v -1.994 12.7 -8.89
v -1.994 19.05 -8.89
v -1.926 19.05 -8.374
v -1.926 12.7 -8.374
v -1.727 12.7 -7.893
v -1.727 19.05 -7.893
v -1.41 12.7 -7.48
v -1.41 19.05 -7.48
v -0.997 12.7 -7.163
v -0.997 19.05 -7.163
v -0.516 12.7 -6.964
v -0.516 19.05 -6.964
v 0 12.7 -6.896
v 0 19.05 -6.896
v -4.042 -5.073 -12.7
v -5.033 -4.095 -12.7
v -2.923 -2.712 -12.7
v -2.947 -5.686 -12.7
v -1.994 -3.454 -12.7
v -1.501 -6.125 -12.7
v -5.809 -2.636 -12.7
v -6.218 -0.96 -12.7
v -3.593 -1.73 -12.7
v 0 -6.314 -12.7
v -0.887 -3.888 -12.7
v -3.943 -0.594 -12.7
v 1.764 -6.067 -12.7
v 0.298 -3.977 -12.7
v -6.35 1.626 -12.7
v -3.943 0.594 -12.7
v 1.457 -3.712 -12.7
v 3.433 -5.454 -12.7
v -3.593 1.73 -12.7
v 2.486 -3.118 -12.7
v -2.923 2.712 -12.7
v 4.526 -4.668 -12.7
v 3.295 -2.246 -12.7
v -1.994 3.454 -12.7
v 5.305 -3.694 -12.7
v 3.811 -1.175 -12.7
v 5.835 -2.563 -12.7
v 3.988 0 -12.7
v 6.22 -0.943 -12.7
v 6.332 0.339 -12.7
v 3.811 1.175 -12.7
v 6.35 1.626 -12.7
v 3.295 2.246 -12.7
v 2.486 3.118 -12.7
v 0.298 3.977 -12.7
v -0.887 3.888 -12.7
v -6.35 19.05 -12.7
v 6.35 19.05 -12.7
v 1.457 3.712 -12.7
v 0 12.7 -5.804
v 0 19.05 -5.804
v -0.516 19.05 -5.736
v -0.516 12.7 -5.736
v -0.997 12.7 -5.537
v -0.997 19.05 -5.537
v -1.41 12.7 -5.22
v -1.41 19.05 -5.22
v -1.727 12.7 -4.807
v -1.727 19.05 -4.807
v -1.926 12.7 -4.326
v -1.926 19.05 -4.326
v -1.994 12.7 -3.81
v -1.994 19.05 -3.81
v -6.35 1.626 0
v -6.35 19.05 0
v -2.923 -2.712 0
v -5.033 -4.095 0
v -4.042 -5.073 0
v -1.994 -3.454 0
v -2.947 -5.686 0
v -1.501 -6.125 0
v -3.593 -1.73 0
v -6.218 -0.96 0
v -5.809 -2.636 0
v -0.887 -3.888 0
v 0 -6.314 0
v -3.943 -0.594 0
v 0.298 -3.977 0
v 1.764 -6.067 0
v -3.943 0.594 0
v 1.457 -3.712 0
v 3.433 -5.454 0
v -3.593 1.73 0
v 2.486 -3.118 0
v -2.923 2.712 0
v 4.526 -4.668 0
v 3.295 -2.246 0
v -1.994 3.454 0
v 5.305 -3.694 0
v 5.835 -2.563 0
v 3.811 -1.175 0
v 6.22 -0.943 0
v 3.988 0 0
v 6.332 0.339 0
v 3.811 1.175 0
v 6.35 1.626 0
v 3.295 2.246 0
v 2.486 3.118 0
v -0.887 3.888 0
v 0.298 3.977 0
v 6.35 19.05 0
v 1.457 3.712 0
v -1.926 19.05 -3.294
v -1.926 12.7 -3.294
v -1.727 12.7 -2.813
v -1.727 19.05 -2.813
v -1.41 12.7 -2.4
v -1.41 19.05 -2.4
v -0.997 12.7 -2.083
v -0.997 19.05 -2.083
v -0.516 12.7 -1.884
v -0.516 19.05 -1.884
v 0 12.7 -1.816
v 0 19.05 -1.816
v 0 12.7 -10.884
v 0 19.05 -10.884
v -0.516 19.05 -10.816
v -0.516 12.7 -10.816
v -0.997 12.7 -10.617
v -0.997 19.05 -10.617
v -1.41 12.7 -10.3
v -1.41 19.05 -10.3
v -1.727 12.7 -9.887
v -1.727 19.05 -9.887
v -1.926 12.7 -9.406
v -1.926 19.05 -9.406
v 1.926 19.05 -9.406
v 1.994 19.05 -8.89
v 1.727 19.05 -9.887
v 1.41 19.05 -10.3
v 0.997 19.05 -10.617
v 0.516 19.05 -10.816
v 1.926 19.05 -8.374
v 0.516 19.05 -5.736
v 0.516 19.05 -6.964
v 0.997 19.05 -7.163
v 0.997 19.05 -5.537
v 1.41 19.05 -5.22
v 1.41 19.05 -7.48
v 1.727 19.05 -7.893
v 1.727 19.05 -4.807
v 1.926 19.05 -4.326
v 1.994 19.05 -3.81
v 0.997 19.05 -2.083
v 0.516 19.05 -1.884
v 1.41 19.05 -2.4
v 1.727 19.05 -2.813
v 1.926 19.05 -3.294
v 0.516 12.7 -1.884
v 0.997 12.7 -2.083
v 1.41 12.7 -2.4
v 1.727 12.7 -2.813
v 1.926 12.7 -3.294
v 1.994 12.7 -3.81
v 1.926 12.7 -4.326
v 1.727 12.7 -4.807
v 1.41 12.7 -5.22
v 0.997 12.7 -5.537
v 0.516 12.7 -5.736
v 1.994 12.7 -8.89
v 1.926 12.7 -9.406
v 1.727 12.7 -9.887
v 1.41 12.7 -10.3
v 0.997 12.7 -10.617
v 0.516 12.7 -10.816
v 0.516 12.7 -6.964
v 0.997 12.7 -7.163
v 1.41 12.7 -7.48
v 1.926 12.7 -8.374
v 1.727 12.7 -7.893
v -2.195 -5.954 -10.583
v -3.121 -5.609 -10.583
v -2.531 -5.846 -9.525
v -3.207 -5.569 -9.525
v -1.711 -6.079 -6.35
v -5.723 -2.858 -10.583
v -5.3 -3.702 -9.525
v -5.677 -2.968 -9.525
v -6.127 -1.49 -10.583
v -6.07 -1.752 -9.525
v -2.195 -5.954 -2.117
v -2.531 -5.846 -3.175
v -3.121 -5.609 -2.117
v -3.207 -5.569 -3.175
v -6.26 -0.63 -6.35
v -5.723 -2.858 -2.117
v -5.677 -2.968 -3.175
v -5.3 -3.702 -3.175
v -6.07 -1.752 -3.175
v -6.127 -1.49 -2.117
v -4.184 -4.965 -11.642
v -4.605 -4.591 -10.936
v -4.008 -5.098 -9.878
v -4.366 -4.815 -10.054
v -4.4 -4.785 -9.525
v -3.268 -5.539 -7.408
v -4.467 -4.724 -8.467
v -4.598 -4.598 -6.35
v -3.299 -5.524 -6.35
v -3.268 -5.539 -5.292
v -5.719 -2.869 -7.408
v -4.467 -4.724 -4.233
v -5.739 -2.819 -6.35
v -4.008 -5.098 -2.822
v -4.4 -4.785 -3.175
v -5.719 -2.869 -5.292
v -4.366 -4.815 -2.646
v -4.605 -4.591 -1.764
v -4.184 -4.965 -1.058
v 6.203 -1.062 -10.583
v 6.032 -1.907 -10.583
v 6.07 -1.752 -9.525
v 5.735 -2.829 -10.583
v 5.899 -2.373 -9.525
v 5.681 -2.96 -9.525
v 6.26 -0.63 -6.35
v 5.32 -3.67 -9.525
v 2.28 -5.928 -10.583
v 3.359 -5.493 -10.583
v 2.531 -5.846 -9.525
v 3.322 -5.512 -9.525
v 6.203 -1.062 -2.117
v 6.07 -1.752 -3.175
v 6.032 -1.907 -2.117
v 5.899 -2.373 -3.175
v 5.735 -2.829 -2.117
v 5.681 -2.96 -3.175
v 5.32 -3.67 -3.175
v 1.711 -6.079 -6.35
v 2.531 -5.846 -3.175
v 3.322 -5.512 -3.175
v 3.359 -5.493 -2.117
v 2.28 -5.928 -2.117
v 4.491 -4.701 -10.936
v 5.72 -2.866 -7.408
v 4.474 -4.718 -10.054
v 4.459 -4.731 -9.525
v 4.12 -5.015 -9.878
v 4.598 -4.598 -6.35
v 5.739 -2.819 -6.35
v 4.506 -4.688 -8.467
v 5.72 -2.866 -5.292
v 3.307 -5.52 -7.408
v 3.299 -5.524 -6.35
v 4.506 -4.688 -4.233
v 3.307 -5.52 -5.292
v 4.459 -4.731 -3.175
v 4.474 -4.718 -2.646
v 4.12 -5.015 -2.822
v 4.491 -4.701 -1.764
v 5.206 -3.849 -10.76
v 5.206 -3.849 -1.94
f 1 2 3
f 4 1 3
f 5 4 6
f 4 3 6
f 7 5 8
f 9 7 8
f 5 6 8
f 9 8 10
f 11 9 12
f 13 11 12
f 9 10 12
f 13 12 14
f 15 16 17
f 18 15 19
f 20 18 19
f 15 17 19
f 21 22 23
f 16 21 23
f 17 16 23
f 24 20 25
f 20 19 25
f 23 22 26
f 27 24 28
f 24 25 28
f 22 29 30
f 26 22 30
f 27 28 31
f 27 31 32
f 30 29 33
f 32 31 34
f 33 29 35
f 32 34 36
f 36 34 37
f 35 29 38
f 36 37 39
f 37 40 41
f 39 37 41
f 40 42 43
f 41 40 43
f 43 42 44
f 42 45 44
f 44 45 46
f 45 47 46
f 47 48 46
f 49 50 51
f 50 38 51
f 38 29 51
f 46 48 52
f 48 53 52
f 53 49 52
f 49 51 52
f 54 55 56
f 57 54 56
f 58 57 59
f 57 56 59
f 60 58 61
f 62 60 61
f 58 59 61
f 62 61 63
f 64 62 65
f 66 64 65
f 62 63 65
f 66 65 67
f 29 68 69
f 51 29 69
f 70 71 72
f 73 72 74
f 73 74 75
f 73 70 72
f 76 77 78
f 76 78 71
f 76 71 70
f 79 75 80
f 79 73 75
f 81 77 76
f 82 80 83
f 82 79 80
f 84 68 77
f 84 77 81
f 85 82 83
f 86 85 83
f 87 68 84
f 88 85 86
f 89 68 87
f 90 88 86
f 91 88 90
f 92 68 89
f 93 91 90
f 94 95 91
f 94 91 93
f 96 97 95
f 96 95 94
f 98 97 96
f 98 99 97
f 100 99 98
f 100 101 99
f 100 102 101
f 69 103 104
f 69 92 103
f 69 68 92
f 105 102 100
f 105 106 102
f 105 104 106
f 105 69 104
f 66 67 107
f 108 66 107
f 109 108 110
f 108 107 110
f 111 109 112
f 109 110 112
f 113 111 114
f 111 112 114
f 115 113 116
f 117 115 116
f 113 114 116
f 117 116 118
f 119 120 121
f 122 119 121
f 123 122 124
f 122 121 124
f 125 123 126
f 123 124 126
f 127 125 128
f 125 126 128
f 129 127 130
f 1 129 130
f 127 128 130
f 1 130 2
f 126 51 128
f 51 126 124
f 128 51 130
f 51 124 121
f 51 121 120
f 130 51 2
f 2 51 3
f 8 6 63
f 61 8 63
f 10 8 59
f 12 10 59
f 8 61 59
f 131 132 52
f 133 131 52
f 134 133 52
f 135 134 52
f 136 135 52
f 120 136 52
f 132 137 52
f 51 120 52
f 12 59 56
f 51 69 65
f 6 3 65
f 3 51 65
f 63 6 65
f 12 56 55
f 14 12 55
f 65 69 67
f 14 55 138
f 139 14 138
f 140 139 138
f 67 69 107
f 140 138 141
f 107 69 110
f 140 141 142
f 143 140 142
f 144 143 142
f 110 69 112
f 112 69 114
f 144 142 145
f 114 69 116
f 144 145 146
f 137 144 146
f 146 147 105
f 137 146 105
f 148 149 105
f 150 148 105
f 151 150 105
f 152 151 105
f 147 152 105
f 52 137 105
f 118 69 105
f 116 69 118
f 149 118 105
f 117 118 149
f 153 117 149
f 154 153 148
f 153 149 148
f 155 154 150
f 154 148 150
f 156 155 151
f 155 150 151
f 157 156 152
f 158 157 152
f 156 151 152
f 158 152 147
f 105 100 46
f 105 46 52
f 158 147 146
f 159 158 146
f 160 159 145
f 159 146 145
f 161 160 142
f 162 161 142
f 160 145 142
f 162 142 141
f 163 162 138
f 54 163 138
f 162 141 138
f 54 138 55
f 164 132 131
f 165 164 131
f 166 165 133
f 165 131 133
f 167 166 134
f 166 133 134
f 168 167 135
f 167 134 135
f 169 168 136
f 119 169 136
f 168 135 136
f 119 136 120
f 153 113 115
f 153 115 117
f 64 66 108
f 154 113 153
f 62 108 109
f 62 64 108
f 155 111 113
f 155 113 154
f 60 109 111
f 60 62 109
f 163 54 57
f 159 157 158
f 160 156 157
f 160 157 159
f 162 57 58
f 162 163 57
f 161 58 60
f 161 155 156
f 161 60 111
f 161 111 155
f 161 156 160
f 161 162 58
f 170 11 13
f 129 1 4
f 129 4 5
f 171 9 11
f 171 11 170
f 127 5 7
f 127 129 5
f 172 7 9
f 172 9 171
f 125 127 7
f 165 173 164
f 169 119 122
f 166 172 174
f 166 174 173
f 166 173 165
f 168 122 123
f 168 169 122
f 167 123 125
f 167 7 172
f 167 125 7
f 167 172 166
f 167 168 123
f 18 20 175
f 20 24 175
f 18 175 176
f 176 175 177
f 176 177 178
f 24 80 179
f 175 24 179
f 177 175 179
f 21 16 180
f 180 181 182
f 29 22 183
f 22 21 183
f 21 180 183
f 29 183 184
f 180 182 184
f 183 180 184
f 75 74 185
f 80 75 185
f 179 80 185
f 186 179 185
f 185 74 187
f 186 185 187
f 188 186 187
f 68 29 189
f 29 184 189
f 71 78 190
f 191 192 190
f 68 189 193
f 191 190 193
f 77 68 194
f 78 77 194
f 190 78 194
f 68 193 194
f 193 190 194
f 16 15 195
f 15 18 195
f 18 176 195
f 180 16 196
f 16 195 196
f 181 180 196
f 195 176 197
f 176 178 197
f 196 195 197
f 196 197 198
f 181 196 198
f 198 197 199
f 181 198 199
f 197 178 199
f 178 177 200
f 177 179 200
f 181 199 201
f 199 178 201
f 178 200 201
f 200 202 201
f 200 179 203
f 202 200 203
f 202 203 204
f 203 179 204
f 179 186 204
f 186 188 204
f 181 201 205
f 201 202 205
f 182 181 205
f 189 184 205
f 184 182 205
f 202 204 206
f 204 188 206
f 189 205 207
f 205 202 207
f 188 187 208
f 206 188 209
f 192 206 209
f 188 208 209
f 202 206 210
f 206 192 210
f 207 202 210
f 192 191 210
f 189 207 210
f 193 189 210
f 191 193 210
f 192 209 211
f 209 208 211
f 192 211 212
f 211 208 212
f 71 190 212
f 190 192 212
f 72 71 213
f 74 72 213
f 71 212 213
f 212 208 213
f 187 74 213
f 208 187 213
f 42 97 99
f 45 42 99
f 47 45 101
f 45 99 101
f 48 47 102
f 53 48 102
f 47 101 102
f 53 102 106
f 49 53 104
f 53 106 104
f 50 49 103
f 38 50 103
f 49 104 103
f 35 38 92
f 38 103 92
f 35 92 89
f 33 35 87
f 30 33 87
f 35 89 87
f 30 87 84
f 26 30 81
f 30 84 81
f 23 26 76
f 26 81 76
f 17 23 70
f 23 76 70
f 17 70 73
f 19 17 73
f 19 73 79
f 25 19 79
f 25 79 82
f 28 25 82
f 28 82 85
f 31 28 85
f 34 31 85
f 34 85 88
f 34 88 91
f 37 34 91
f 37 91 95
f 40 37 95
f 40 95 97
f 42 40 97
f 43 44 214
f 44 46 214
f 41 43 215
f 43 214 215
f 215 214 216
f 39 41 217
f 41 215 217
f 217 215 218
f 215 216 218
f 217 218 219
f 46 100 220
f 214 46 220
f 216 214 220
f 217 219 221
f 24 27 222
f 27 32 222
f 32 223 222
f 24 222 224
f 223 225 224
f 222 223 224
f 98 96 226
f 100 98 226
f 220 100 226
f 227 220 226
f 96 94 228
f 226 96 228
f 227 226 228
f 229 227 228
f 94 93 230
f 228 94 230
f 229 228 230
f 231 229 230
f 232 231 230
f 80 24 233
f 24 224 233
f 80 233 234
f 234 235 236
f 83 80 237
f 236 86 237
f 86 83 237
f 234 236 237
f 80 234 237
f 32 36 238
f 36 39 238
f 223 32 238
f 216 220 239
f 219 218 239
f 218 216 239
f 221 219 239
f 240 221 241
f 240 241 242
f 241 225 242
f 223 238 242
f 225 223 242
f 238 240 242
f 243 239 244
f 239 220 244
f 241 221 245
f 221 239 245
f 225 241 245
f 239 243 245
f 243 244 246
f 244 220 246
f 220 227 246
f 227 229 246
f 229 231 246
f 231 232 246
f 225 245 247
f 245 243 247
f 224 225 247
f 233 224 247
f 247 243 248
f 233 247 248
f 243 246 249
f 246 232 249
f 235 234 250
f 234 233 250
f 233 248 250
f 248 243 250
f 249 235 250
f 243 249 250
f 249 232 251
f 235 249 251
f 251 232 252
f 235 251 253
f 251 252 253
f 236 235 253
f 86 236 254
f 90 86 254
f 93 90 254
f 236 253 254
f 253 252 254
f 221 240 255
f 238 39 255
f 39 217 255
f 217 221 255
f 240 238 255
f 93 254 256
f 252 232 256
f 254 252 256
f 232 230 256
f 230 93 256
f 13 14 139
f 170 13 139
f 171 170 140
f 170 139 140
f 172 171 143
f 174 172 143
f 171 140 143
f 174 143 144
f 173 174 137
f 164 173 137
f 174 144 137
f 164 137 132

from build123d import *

# Parameters (mm, degrees)
SKETCH1_W           = 12.7
SKETCH1_H           = 12.7
SKETCH1_R           = 3.9878
BOSS_EXTRUDE1_DEPTH = 12.7
FILLET1_SIZE        = 7.9756
CUT_EXTRUDE2_DEPTH  = 6.35
SKETCH1_3_R         = 3.9878
CUT_EXTRUDE3_DEPTH  = 24.759524566


with BuildPart() as part:
    # Sketch1 → Boss-Extrude1 (new body)
    # profile 1 of 3: a face of its own
    with BuildSketch(Plane.XY):
        with Locations((0, 12.7)):
            Rectangle(SKETCH1_W, SKETCH1_H)
    # profile 2 of 3: a face of its own
    with BuildSketch(Plane.XY):
        Rectangle(SKETCH1_W, SKETCH1_H)
        Circle(SKETCH1_R, mode=Mode.SUBTRACT)
    # profile 3 of 3: a face of its own
    with BuildSketch(Plane.XY):
        Circle(SKETCH1_R)
    extrude(amount=-BOSS_EXTRUDE1_DEPTH)

    # Fillet1
    # a fillet whose section is not a circle: 7.9756 mm, written as the material it takes off along each edge
    with BuildSketch(Plane(origin=(-6.35, -6.35, 19.939), x_dir=(1, 0, 0), z_dir=(0, 0, -1)), Plane(origin=(6.35, -6.35, 19.939), x_dir=(0, 1, 0), z_dir=(0, 0, -1))) as fillet1_piece_1:
        with BuildLine():
            add(Edge.make_bspline([(FILLET1_SIZE, 0), (FILLET1_SIZE * 0.831801948466, 0), (FILLET1_SIZE * 0.663603896932, 0), (FILLET1_SIZE * 0.292893218813, -FILLET1_SIZE * 0.0716919198361), (FILLET1_SIZE * 0.0716919198361, -FILLET1_SIZE * 0.292893218813), (0, -FILLET1_SIZE * 0.663603896932), (0, -FILLET1_SIZE * 0.831801948466), (0, -FILLET1_SIZE)], knots=[0, 0, 0, 0, 0, 0, 0.5, 0.5, 1, 1, 1, 1, 1, 1], degree=5))
            Line((0, -FILLET1_SIZE), (0, 0))
            Line((0, 0), (FILLET1_SIZE, 0))
        make_face()
    extrude(amount=52.578, mode=Mode.SUBTRACT)

    # Sketch3 → Cut-Extrude2 (cut)
    with BuildSketch(Plane(origin=(0, 19.05, 0), x_dir=(1, 0, 0), z_dir=(0, 1, 0))):
        with BuildLine():
            ThreePointArc((1.9939, 8.89), (1.409900211, 10.299900211), (0, 10.8839))
            Line((0, 10.8839), (0, 8.89))
            Line((0, 8.89), (1.9939, 8.89))
        make_face()
        with BuildLine():
            Line((0, 8.89), (0, 10.8839))
            ThreePointArc((0, 10.8839), (-1.409900211, 10.299900211), (-1.9939, 8.89))
            Line((-1.9939, 8.89), (0, 8.89))
        make_face()
        with BuildLine():
            Line((1.9939, 8.89), (0, 8.89))
            Line((0, 8.89), (0, 6.8961))
            ThreePointArc((0, 6.8961), (1.409900211, 7.480099789), (1.9939, 8.89))
        make_face()
        with BuildLine():
            Line((0, 6.8961), (0, 8.89))
            Line((0, 8.89), (-1.9939, 8.89))
            ThreePointArc((-1.9939, 8.89), (-1.409900211, 7.480099789), (0, 6.8961))
        make_face()
        with BuildLine():
            ThreePointArc((1.9939, 3.81), (1.409900211, 5.219900211), (0, 5.8039))
            Line((0, 5.8039), (0, 3.81))
            Line((0, 3.81), (1.9939, 3.81))
        make_face()
        with BuildLine():
            Line((0, 3.81), (0, 5.8039))
            ThreePointArc((0, 5.8039), (-1.409900211, 5.219900211), (-1.9939, 3.81))
            Line((-1.9939, 3.81), (0, 3.81))
        make_face()
        with BuildLine():
            ThreePointArc((0, 1.8161), (1.409900211, 2.400099789), (1.9939, 3.81))
            Line((1.9939, 3.81), (0, 3.81))
            Line((0, 3.81), (0, 1.8161))
        make_face()
        with BuildLine():
            Line((0, 3.81), (-1.9939, 3.81))
            ThreePointArc((-1.9939, 3.81), (-1.409900211, 2.400099789), (0, 1.8161))
            Line((0, 1.8161), (0, 3.81))
        make_face()
    extrude(amount=-CUT_EXTRUDE2_DEPTH, mode=Mode.SUBTRACT)

    # Sketch1<3> → Cut-Extrude3 (cut, through all)
    with BuildSketch(Plane.XY):
        Circle(SKETCH1_3_R)
    extrude(amount=-CUT_EXTRUDE3_DEPTH, mode=Mode.SUBTRACT)


solid = part.part
